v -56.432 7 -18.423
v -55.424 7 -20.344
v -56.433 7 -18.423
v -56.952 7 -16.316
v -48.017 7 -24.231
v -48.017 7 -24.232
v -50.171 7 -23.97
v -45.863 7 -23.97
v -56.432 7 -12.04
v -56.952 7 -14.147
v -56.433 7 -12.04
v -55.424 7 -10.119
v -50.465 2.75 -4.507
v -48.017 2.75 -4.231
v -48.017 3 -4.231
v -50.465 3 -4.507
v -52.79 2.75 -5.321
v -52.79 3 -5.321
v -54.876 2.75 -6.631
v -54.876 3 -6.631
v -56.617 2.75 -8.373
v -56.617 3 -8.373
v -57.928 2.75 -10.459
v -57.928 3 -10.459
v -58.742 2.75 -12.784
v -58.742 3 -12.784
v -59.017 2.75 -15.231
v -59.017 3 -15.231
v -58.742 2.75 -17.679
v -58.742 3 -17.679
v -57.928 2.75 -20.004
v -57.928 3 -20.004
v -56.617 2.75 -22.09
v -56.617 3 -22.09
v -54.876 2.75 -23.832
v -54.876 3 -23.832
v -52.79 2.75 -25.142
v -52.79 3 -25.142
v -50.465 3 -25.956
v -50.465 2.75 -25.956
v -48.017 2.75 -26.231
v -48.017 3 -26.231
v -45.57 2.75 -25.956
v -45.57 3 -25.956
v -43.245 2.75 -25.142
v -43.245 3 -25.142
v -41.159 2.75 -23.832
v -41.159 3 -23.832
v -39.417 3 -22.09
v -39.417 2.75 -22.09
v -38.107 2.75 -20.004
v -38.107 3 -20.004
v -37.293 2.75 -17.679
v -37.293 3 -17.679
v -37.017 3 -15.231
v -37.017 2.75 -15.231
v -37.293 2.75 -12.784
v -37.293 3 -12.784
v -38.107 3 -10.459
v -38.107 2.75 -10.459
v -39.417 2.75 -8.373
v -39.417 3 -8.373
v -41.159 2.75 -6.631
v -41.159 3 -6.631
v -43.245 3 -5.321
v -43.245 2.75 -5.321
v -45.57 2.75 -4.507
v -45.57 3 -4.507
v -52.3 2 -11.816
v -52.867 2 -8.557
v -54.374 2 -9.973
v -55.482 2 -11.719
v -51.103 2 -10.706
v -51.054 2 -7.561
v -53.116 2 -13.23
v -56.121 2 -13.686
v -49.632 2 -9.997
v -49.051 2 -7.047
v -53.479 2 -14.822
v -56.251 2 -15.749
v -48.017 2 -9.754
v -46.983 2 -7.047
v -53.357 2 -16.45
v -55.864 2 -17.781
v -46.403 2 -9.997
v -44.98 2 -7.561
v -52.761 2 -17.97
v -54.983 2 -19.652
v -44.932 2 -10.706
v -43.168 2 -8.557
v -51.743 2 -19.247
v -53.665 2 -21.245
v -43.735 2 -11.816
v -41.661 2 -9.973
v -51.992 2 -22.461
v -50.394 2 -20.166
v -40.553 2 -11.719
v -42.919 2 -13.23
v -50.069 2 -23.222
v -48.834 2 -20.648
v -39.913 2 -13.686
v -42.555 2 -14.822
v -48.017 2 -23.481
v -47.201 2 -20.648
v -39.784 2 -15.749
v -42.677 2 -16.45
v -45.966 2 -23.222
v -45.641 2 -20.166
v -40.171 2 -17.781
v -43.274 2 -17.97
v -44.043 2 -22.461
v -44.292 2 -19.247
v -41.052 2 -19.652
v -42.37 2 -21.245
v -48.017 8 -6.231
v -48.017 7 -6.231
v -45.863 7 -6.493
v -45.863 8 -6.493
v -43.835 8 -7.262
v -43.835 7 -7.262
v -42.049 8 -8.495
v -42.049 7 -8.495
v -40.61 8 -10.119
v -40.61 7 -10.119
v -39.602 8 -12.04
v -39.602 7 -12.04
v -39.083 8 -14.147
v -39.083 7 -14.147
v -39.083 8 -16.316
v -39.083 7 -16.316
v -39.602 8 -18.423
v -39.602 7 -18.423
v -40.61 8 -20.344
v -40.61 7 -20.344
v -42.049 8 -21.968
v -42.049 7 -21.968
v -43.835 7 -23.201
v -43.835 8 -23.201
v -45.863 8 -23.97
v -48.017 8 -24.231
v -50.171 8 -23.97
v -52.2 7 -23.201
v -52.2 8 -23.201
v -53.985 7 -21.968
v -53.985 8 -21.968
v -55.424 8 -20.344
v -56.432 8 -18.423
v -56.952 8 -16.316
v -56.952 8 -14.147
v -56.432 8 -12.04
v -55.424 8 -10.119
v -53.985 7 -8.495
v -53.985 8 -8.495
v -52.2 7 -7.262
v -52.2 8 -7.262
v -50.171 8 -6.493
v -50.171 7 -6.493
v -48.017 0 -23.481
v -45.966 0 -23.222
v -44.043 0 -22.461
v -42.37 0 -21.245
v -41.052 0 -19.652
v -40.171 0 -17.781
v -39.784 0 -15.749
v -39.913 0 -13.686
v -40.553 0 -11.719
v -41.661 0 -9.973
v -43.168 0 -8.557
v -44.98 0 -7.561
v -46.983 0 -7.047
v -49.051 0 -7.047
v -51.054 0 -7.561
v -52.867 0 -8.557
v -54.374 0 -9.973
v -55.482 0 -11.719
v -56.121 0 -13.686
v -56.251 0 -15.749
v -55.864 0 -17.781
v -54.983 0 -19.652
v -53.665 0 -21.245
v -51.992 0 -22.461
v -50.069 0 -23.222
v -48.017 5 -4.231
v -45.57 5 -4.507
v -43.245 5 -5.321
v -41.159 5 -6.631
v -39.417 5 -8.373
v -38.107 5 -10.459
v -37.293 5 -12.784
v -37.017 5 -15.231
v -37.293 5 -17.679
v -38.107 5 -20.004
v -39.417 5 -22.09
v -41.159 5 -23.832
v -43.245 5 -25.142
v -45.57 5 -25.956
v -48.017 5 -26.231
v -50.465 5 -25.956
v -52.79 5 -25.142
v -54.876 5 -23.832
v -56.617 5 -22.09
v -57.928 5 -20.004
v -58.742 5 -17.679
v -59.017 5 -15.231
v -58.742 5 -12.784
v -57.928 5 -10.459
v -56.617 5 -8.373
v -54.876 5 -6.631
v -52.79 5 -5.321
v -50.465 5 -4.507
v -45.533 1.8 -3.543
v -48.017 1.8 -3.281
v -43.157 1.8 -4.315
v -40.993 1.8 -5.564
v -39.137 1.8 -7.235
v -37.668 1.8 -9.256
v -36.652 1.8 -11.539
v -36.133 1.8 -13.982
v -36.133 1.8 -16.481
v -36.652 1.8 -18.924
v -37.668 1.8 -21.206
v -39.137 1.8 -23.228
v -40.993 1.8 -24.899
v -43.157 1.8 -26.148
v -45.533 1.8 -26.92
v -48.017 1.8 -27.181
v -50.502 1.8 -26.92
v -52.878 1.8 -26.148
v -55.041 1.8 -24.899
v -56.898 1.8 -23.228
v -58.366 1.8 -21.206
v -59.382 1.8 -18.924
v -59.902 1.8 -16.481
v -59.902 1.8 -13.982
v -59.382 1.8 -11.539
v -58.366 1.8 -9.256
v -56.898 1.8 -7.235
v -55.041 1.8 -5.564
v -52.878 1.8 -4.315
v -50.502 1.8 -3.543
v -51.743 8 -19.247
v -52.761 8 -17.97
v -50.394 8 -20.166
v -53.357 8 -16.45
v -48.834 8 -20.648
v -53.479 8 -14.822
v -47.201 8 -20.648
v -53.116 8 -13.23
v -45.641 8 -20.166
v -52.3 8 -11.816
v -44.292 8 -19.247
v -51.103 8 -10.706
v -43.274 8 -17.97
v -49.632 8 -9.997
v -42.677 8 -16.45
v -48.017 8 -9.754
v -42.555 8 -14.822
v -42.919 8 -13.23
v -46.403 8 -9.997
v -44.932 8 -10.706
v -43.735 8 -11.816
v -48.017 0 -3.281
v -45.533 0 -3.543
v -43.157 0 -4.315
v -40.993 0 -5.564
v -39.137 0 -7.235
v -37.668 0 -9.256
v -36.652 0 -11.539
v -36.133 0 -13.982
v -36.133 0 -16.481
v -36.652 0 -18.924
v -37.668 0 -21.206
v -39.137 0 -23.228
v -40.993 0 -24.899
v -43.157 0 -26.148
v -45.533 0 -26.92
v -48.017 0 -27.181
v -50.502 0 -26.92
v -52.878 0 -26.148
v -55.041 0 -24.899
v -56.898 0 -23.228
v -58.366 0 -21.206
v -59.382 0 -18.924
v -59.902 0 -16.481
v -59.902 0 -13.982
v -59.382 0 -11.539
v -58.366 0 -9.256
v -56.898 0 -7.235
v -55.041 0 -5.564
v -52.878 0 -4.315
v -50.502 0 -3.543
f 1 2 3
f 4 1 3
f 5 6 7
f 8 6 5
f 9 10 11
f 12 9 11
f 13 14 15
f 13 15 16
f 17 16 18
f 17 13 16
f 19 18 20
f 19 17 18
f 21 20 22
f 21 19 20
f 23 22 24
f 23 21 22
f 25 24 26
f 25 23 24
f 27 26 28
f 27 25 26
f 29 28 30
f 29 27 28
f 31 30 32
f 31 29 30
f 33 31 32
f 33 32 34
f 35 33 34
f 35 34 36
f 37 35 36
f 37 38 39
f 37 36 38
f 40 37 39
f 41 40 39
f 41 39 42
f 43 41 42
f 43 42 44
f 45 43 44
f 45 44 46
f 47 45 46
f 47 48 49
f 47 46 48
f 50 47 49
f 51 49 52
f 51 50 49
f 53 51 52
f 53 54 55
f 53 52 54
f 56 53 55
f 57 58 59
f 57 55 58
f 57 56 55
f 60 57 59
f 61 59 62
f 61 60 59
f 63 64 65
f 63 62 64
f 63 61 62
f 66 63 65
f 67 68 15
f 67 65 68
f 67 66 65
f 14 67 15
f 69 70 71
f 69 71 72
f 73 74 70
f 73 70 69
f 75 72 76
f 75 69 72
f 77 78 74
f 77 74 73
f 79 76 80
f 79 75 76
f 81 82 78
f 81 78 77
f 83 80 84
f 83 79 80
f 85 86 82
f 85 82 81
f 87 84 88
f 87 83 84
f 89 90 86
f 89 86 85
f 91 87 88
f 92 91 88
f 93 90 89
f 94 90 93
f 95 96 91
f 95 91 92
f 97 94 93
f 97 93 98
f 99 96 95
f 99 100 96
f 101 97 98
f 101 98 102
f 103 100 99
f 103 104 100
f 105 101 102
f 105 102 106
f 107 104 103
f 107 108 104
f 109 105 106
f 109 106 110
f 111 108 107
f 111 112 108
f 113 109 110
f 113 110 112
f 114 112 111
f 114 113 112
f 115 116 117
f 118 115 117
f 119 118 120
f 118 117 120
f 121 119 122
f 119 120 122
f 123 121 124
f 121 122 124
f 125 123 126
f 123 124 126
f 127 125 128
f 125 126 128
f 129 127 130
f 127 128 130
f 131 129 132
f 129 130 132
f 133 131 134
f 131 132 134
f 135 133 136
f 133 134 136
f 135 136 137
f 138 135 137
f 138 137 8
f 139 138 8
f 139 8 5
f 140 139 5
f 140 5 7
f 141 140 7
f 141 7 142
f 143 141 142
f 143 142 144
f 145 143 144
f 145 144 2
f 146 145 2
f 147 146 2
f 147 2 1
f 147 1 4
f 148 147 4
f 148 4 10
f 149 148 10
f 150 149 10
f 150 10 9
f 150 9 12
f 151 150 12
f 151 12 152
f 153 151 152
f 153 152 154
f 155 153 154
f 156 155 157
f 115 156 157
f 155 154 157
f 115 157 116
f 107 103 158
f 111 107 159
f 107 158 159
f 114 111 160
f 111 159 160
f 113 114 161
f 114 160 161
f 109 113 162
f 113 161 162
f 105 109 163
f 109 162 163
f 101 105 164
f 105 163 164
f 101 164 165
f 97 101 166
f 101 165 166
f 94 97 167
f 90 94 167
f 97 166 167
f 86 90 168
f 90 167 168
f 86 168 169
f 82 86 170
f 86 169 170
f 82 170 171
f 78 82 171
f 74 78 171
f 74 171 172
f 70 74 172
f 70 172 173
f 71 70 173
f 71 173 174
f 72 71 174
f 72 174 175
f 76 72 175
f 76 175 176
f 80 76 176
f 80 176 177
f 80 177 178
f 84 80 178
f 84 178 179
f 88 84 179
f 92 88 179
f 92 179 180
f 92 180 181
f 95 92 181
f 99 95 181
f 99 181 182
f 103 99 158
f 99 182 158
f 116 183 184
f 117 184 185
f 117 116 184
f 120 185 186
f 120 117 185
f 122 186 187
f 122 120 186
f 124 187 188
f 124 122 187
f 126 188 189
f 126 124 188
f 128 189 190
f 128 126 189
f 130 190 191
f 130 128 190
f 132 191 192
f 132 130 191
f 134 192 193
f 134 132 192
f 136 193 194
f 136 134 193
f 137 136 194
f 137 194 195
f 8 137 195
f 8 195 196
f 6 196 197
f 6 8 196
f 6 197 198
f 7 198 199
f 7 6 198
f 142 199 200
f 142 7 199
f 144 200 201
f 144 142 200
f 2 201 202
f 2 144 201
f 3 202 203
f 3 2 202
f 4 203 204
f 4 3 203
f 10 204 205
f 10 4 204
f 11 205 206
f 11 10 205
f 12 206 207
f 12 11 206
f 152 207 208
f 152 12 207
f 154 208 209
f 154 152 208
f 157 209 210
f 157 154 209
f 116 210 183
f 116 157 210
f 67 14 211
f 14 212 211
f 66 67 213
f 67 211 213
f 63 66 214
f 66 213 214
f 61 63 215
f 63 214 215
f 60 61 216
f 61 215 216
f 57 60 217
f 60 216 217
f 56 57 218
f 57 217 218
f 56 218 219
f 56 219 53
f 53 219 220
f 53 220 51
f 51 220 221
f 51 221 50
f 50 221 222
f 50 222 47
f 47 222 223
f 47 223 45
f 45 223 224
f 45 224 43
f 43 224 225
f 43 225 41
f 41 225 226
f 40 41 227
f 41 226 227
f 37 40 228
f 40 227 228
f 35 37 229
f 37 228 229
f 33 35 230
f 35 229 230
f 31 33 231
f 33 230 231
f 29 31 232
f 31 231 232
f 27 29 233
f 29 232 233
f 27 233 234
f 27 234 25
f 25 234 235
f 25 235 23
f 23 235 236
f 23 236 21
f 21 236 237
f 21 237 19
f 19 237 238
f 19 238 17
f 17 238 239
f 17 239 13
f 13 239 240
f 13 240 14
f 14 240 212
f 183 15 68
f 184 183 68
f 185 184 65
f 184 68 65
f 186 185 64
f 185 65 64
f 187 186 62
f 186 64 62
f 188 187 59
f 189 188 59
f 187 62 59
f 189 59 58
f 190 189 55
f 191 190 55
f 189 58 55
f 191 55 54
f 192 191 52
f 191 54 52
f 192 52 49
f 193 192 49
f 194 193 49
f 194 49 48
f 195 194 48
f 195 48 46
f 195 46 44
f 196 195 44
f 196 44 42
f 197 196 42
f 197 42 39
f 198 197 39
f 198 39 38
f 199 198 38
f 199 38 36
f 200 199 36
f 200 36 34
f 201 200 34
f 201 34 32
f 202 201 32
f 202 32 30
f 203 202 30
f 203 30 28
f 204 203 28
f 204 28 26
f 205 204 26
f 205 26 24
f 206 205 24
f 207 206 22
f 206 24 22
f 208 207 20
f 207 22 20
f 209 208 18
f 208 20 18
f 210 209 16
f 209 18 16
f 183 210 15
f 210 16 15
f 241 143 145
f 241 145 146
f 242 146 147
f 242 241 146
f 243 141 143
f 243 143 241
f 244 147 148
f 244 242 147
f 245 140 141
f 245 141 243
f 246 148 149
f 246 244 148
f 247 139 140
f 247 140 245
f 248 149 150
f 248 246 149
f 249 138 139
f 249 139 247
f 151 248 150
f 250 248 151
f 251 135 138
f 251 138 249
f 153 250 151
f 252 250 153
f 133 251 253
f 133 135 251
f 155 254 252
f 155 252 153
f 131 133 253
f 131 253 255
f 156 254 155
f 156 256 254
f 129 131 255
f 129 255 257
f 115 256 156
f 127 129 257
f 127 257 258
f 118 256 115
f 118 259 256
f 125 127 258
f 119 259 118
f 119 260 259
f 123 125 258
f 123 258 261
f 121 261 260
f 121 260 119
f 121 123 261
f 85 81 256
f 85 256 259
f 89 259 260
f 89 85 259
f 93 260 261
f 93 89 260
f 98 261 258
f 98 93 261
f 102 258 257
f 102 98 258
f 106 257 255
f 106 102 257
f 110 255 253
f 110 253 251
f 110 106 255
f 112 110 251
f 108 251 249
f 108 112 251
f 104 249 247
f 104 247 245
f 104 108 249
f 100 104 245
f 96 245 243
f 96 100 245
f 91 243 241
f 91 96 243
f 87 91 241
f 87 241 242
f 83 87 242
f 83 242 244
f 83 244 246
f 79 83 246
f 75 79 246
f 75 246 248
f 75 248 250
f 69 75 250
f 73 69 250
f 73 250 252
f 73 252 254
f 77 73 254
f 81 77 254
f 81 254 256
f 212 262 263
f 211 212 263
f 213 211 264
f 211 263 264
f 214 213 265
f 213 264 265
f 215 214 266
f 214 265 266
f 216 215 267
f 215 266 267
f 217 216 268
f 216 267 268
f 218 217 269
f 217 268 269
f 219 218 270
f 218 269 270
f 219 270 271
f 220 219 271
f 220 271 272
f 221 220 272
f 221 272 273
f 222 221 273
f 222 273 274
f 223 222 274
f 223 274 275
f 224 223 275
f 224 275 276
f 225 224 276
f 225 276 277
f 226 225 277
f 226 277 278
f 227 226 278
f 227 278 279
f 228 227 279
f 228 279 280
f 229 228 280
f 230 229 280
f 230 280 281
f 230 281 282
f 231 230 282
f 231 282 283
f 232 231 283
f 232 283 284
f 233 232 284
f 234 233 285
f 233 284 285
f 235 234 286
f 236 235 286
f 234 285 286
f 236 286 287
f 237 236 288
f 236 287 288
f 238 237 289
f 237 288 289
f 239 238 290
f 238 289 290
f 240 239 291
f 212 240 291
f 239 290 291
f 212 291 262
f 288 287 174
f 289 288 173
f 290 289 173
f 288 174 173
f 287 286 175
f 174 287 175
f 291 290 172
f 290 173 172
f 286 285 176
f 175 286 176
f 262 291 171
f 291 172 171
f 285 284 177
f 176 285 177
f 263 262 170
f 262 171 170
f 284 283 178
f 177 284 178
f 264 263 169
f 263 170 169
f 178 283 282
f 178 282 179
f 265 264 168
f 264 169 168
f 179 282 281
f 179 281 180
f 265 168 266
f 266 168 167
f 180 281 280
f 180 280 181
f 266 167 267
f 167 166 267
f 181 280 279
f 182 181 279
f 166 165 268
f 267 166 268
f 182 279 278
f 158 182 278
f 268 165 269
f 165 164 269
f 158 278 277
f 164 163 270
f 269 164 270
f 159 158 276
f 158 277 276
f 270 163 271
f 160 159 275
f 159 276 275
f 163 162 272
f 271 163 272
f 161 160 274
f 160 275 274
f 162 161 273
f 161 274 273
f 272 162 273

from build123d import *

# Parameters (mm, degrees)
SZKIC1_R                    = 9
SZKIC1_R_2                  = 5.477333333
DODANIE_WYCI_GNI_CIE1_DEPTH = 8
SZKIC1_3_R                  = 11
SZKIC1_3_R_2                = 9
DODANIE_WYCI_GNI_CIE2_DEPTH = 7
SZKIC1_4_R                  = 11.95
SZKIC1_4_R_2                = 11
DODANIE_WYCI_GNI_CIE3_DEPTH = 3
DODANIE_WYCI_GNI_CIE4_START = -3
SZKIC1_5_R                  = 11.95
SZKIC1_5_R_2                = 1.65
SZKIC1_5_R_3                = 11
SZKIC1_5_R_4                = 9
SZKIC1_5_R_5                = 5.477333333
DODANIE_WYCI_GNI_CIE4_DEPTH = 3
SZKIC2_R                    = 8.25
WYTNIJ_WYCI_GNI_CIE1_DEPTH  = 5
SFAZOWANIE1_SIZE            = 1.2
DODANIE_WYCI_GNI_CIE5_START = 17
SZKIC3_R                    = 1.65
DODANIE_WYCI_GNI_CIE5_DEPTH = 17
ZAOKR_GLENIE1_R             = 10
ZAOKR_GLENIE2_R             = 4
SFAZOWANIE2_SIZE            = 2
WYTNIJ_WYCI_GNI_CIE3_DEPTH  = 81.474279011


# Some blends are built 0.0001 mm under size
with BuildPart() as part:
    # Szkic1 → Dodanie-wyciągnięcie1 (new body)
    with BuildSketch(Plane(origin=(0, 0, 0), x_dir=(1, 0, 0), z_dir=(0, 1, 0))):
        with Locations(Location((-48.017326928, 15.231452718, 0), (0, 0, 270))):
            Circle(SZKIC1_R)
        with Locations(Location((-48.017326928, 15.231452718, 0), (0, 0, 270))):
            Circle(SZKIC1_R_2, mode=Mode.SUBTRACT)
    extrude(amount=DODANIE_WYCI_GNI_CIE1_DEPTH)

    # Szkic1<3> → Dodanie-wyciągnięcie2 (add)
    with BuildSketch(Plane(origin=(0, 0, 0), x_dir=(1, 0, 0), z_dir=(0, 1, 0))):
        with Locations(Location((-48.017326928, 15.231452718, 0), (0, 0, 270))):
            Circle(SZKIC1_3_R)
        with Locations(Location((-48.017326928, 15.231452718, 0), (0, 0, 270))):
            Circle(SZKIC1_3_R_2, mode=Mode.SUBTRACT)
    extrude(amount=DODANIE_WYCI_GNI_CIE2_DEPTH)

    # Szkic1<4> → Dodanie-wyciągnięcie3 (add)
    with BuildSketch(Plane(origin=(0, 0, 0), x_dir=(1, 0, 0), z_dir=(0, 1, 0))):
        with Locations(Location((-48.017326928, 15.231452718, 0), (0, 0, 270))):
            Circle(SZKIC1_4_R)
        with Locations(Location((-48.017326928, 15.231452718, 0), (0, 0, 270))):
            Circle(SZKIC1_4_R_2, mode=Mode.SUBTRACT)
    extrude(amount=DODANIE_WYCI_GNI_CIE3_DEPTH)

    # Szkic1<5> → Dodanie-wyciągnięcie4 (add)
    # profile 1 of 4: a face of its own
    with BuildSketch(Plane(origin=(0, 0, 0), x_dir=(1, 0, 0), z_dir=(0, 1, 0)).offset(DODANIE_WYCI_GNI_CIE4_START)):
        with BuildLine():
            Line((-69.017326928, 26.22592553), (-69.017326928, 4.236979905))
            ThreePointArc((-69.017326928, 4.236979905), (-67.978820752, -1.151729035), (-65.012060165, -5.768547282))
            Line((-65.012060165, -5.768547282), (-50.017326928, -5.768547282))
            Line((-50.017326928, -5.768547282), (-30.833560744, -5.768547282))
            Line((-30.833560744, -5.768547282), (-26.817326928, -1.752313466))
            Line((-26.817326928, -1.752313466), (-26.817326928, 32.215218902))
            Line((-26.817326928, 32.215218902), (-30.833560744, 36.231452718))
            Line((-30.833560744, 36.231452718), (-50.017326928, 36.231452718))
            Line((-50.017326928, 36.231452718), (-65.012060165, 36.231452718))
            ThreePointArc((-65.012060165, 36.231452718), (-67.978820752, 31.61463447), (-69.017326928, 26.22592553))
        make_face()
        with Locations(Location((-48.017326928, 15.231452718, 0), (0, 0, 270))):
            Circle(SZKIC1_5_R, mode=Mode.SUBTRACT)
        with Locations(Location((-63.517326928, -0.268547282, 0), (0, 0, 270))):
            Circle(SZKIC1_5_R_2, mode=Mode.SUBTRACT)
        with Locations(Location((-32.517326928, -0.268547282, 0), (0, 0, 270))):
            Circle(SZKIC1_5_R_2, mode=Mode.SUBTRACT)
        with Locations(Location((-32.517326928, 30.731452718, 0), (0, 0, 270))):
            Circle(SZKIC1_5_R_2, mode=Mode.SUBTRACT)
        with Locations(Location((-63.517326928, 30.731452718, 0), (0, 0, 270))):
            Circle(SZKIC1_5_R_2, mode=Mode.SUBTRACT)
    # profile 2 of 4: a face of its own
    with BuildSketch(Plane(origin=(0, 0, 0), x_dir=(1, 0, 0), z_dir=(0, 1, 0)).offset(DODANIE_WYCI_GNI_CIE4_START)):
        with Locations(Location((-48.017326928, 15.231452718, 0), (0, 0, 270))):
            Circle(SZKIC1_5_R)
        with Locations(Location((-48.017326928, 15.231452718, 0), (0, 0, 270))):
            Circle(SZKIC1_5_R_3, mode=Mode.SUBTRACT)
    # profile 3 of 4: a face of its own
    with BuildSketch(Plane(origin=(0, 0, 0), x_dir=(1, 0, 0), z_dir=(0, 1, 0)).offset(DODANIE_WYCI_GNI_CIE4_START)):
        with Locations(Location((-48.017326928, 15.231452718, 0), (0, 0, 270))):
            Circle(SZKIC1_5_R_3)
        with Locations(Location((-48.017326928, 15.231452718, 0), (0, 0, 270))):
            Circle(SZKIC1_5_R_4, mode=Mode.SUBTRACT)
    # profile 4 of 4: a face of its own
    with BuildSketch(Plane(origin=(0, 0, 0), x_dir=(1, 0, 0), z_dir=(0, 1, 0)).offset(DODANIE_WYCI_GNI_CIE4_START)):
        with Locations(Location((-48.017326928, 15.231452718, 0), (0, 0, 270))):
            Circle(SZKIC1_5_R_4)
        with Locations(Location((-48.017326928, 15.231452718, 0), (0, 0, 270))):
            Circle(SZKIC1_5_R_5, mode=Mode.SUBTRACT)
    extrude(amount=DODANIE_WYCI_GNI_CIE4_DEPTH)

    # Szkic2 → Wytnij-wyciągnięcie1 (cut)
    with BuildSketch(Plane.XZ.offset(3)):
        with Locations(Location((-48.017326928, -15.231452718, 0), (0, 0, 270))):
            Circle(SZKIC2_R)
    extrude(amount=-WYTNIJ_WYCI_GNI_CIE1_DEPTH, mode=Mode.SUBTRACT)

    # Sfazowanie1
    # the kernel refuses this chamfer: 1.2 mm, written as the material it takes off along each edge
    with BuildSketch(Plane(origin=(-48.017326928, 3, -15.231452718), x_dir=(0, 0, 1), z_dir=(-1, 0, 0))) as sfazowanie1_piece_1_section:
        Polygon((11.95 - SFAZOWANIE1_SIZE, 0), (11.95, -SFAZOWANIE1_SIZE), (11.95, 0), align=None)
    sfazowanie1_piece_1 = revolve(axis=Axis((-48.017326928, 3, -15.231452718), (0, 1, 0)), mode=Mode.PRIVATE)
    sfazowanie1_piece_1 = sfazowanie1_piece_1 - Plane(origin=(-48.017326928, 2.284838346, -15.231452718), x_dir=(0, 0, 1), z_dir=(0, -1, 0)) * Cylinder(11, 48, mode=Mode.PRIVATE)
    add(sfazowanie1_piece_1, mode=Mode.SUBTRACT)

    # Szkic3 → Dodanie-wyciągnięcie5 (add)
    with BuildSketch(Plane.XZ.offset(3).offset(DODANIE_WYCI_GNI_CIE5_START)):
        with BuildLine():
            Line((-69.017326928, -26.22592553), (-36.817326928, -26.22592553))
            Line((-36.817326928, -26.22592553), (-36.817326928, -4.236979905))
            Line((-36.817326928, -4.236979905), (-69.017326928, -4.236979905))
            ThreePointArc((-69.017326928, -4.236979905), (-67.978820752, 1.151729035), (-65.012060165, 5.768547282))
            Line((-65.012060165, 5.768547282), (-30.833560744, 5.768547282))
            Line((-30.833560744, 5.768547282), (-26.817326928, 1.752313466))
            Line((-26.817326928, 1.752313466), (-26.817326928, -32.215218902))
            Line((-26.817326928, -32.215218902), (-30.833560744, -36.231452718))
            Line((-30.833560744, -36.231452718), (-65.012060165, -36.231452718))
            ThreePointArc((-65.012060165, -36.231452718), (-67.978820752, -31.61463447), (-69.017326928, -26.22592553))
        make_face()
        with Locations(Location((-63.517326928, 0.268547282, 0), (0, 0, 90))):
            Circle(SZKIC3_R, mode=Mode.SUBTRACT)
        with Locations(Location((-32.517326928, 0.268547282, 0), (0, 0, 90))):
            Circle(SZKIC3_R, mode=Mode.SUBTRACT)
        with Locations(Location((-32.517326928, -30.731452718, 0), (0, 0, 90))):
            Circle(SZKIC3_R, mode=Mode.SUBTRACT)
        with Locations(Location((-63.517326928, -30.731452718, 0), (0, 0, 90))):
            Circle(SZKIC3_R, mode=Mode.SUBTRACT)
    extrude(amount=-DODANIE_WYCI_GNI_CIE5_DEPTH)

    # Zaokrąglenie1
    zaokr_glenie1_edges = [part.edges().sort_by_distance(p)[0] for p in [
        (-36.817326928, -11.5, -4.236979905),
        (-36.817326928, -11.5, -26.22592553),
    ]]
    fillet(zaokr_glenie1_edges, radius=ZAOKR_GLENIE1_R)

    # Zaokrąglenie2
    zaokr_glenie2_edges = [part.edges().sort_by_distance(p)[0] for p in [
        (-65.012060165, -10, -36.231452718),
        (-30.833560744, -10, -36.231452718),
        (-26.817326928, -10, -32.215218902),
        (-26.817326928, -10, 1.752313466),
        (-30.833560744, -10, 5.768547282),
        (-65.012060165, -10, 5.768547282),
        (-69.017326928, -11.5, -26.22592553),
        (-69.017326928, -11.5, -4.236979905),
    ]]
    fillet(zaokr_glenie2_edges, radius=ZAOKR_GLENIE2_R)

    # Sfazowanie2
    sfazowanie2_edges = [part.edges().sort_by_distance(p)[0] for p in [
        (-48.017326928, 7, -26.231452718),
    ]]
    chamfer(sfazowanie2_edges, length=SFAZOWANIE2_SIZE - 0.0001)  # a hair under: the kernel refuses the full size

    # Szkic5 → Wytnij-wyciągnięcie3 (cut, through all)
    with BuildSketch(Plane(origin=(0, 0, 0), x_dir=(1, 0, 0), z_dir=(0, 1, 0))):
        with BuildLine():
            Line((-63.130319625, -5.768547282), (-32.490414994, -5.768547282))
            ThreePointArc((-32.490414994, -5.768547282), (-30.959681264, -5.464065412), (-29.661987869, -4.596974407))
            Line((-29.661987869, -4.596974407), (-27.988899803, -2.923886342))
            ThreePointArc((-27.988899803, -2.923886342), (-27.121808798, -1.626192946), (-26.817326928, -0.095459217))
            Line((-26.817326928, -0.095459217), (-26.817326928, 30.558364652))
            ThreePointArc((-26.817326928, 30.558364652), (-27.121808798, 32.089098382), (-27.988899803, 33.386791777))
            Line((-27.988899803, 33.386791777), (-29.661987869, 35.059879842))
            ThreePointArc((-29.661987869, 35.059879842), (-30.959681264, 35.926970848), (-32.490414994, 36.231452718))
            Line((-32.490414994, 36.231452718), (-63.130319625, 36.231452718))
            ThreePointArc((-63.130319625, 36.231452718), (-64.980822324, 35.777667568), (-66.411459701, 34.519272599))
            ThreePointArc((-66.411459701, 34.519272599), (-68.350528387, 30.572480189), (-69.017326928, 26.22592553))
            Line((-69.017326928, 26.22592553), (-69.017326928, 4.236979905))
            ThreePointArc((-69.017326928, 4.236979905), (-68.350528387, -0.109574754), (-66.411459701, -4.056367163))
            ThreePointArc((-66.411459701, -4.056367163), (-64.980822324, -5.314762132), (-63.130319625, -5.768547282))
        make_face()
    extrude(amount=-WYTNIJ_WYCI_GNI_CIE3_DEPTH, mode=Mode.SUBTRACT)


solid = part.part
